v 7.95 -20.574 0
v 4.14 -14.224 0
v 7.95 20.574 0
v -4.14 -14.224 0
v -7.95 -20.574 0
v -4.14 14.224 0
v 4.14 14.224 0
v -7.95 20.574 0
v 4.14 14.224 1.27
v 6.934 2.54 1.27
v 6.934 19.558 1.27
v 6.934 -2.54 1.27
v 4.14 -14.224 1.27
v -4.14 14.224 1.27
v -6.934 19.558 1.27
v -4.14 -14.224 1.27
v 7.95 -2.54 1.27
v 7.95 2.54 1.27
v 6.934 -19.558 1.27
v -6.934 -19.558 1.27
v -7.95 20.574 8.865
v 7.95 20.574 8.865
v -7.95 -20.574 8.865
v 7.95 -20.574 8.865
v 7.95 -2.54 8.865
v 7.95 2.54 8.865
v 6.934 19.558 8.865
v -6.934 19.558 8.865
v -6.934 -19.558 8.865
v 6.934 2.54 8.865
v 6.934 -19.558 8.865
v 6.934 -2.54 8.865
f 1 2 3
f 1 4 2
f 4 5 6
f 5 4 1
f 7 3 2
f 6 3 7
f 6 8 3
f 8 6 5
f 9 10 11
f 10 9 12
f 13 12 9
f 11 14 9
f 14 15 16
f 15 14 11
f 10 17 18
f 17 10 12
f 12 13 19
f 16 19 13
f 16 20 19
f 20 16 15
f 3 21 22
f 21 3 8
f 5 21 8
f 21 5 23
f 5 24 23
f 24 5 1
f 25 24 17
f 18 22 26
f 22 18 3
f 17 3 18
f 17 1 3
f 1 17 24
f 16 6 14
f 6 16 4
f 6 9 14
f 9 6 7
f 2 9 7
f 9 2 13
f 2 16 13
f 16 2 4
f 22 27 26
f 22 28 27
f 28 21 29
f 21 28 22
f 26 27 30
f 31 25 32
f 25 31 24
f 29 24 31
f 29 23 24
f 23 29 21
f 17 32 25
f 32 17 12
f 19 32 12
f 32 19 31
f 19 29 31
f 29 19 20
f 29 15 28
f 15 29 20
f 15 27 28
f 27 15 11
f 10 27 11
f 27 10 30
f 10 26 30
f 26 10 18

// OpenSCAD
ViewScale = [0.0254, 0.0254, 0.0254];

// Programming Board 803x 1340
// Watch Board 1520 526

progboardW = 1340;
progboardH = 803;
watchboardW = 526;
watchboardH = 1520;

module model_progboard()
{
    // Main board
    color("cyan")
    linear_extrude(50)
    square([progboardW, progboardH], center=true);

    // Buttons and ribbon connector
    color("cornflowerblue")
    translate([progboardW/2-158/2-40, 0, 49])
    linear_extrude(80)
    square([158, 500], center=true);

    // USB-C connector
    color("cornflowerblue")
    translate([-progboardW/2+354/2-50, -progboardH/2+300/2+40, 49])
    linear_extrude(125)
    square([354, 300], center=true);

    // Mini-USB connector
    color("cornflowerblue")
    translate([-progboardW/2+220/2-50, progboardH/2-320/2-50, 49])
    linear_extrude(94)
    square([220, 320], center=true);
}

module model_watchboard()
{
    color("cyan")
    linear_extrude(230)
    square([watchboardW, watchboardH], center=true);
}

module watchboard()
{
    //rotate([0, -45, 0])
    //translate([500, 0, 0]) {
        *translate([0, 0, 50])
        model_watchboard();

        // base
        linear_extrude(50)
        difference() {
            square([watchboardW+100, watchboardH+100], center=true);
            square([watchboardW-200, watchboardH-400], center=true);
        }

        // walls
        translate([0, 0, 49])
        linear_extrude(300)
        difference() {
            square([watchboardW+100, watchboardH+100], center=true);
            square([watchboardW+20, watchboardH+20], center=true);
            translate([300, 0, 0])
            square([100, 200], center=true);
        }
   // }
}

module progboard()
{
    translate([-1000, 0, 0])
    {
        *translate([0, 0, 50])
        model_progboard();
        // Bottom
        linear_extrude(50)
        difference() {
            square([progboardW + 100, progboardH + 100], center=true);
            square([progboardW - 50, progboardH - 50], center=true);
        }
        // Sides
        translate([0, 0, 49])
        linear_extrude(71)
        difference() {
            square([progboardW + 100, progboardH + 100], center=true);
            translate([-50, 0, 0])
            square([progboardW + 120, progboardH + 20], center=true);
        }

        // Slot top
        translate([300, 0, 119])
        linear_extrude(40)
        difference() {
            square([progboardW - 500, progboardH + 100], center=true);
            translate([-25, 0, 0])
            square([progboardW - 450, progboardH - 100], center=true);
        }
    }
}

module support()
{
    linear_extrude(50)
    difference() {
        square([300, 1000], center=true);
        translate([-150, 300, 0])
        rotate([0, 0, 45])
        square([200, 200], center=true);
    }

}

module supports()
{
    translate([200, progboardH/2+50, 150])
    rotate([90, 0, 0])
    rotate([0, 0, -90])
    support();

    translate([200, -progboardH/2, 150])
    rotate([90, 0, 0])
    rotate([0, 0, -90])
    support();
}

module forDesign()
{
    progboard();
    translate([0, 0, 0])
    watchboard();
    supports();
}

module forPrinting()
{
//    progboard();
//    translate([0, 0, 0])
    watchboard();
//    supports();
}

scale(ViewScale)
{
    //forDesign();
    forPrinting();
}
